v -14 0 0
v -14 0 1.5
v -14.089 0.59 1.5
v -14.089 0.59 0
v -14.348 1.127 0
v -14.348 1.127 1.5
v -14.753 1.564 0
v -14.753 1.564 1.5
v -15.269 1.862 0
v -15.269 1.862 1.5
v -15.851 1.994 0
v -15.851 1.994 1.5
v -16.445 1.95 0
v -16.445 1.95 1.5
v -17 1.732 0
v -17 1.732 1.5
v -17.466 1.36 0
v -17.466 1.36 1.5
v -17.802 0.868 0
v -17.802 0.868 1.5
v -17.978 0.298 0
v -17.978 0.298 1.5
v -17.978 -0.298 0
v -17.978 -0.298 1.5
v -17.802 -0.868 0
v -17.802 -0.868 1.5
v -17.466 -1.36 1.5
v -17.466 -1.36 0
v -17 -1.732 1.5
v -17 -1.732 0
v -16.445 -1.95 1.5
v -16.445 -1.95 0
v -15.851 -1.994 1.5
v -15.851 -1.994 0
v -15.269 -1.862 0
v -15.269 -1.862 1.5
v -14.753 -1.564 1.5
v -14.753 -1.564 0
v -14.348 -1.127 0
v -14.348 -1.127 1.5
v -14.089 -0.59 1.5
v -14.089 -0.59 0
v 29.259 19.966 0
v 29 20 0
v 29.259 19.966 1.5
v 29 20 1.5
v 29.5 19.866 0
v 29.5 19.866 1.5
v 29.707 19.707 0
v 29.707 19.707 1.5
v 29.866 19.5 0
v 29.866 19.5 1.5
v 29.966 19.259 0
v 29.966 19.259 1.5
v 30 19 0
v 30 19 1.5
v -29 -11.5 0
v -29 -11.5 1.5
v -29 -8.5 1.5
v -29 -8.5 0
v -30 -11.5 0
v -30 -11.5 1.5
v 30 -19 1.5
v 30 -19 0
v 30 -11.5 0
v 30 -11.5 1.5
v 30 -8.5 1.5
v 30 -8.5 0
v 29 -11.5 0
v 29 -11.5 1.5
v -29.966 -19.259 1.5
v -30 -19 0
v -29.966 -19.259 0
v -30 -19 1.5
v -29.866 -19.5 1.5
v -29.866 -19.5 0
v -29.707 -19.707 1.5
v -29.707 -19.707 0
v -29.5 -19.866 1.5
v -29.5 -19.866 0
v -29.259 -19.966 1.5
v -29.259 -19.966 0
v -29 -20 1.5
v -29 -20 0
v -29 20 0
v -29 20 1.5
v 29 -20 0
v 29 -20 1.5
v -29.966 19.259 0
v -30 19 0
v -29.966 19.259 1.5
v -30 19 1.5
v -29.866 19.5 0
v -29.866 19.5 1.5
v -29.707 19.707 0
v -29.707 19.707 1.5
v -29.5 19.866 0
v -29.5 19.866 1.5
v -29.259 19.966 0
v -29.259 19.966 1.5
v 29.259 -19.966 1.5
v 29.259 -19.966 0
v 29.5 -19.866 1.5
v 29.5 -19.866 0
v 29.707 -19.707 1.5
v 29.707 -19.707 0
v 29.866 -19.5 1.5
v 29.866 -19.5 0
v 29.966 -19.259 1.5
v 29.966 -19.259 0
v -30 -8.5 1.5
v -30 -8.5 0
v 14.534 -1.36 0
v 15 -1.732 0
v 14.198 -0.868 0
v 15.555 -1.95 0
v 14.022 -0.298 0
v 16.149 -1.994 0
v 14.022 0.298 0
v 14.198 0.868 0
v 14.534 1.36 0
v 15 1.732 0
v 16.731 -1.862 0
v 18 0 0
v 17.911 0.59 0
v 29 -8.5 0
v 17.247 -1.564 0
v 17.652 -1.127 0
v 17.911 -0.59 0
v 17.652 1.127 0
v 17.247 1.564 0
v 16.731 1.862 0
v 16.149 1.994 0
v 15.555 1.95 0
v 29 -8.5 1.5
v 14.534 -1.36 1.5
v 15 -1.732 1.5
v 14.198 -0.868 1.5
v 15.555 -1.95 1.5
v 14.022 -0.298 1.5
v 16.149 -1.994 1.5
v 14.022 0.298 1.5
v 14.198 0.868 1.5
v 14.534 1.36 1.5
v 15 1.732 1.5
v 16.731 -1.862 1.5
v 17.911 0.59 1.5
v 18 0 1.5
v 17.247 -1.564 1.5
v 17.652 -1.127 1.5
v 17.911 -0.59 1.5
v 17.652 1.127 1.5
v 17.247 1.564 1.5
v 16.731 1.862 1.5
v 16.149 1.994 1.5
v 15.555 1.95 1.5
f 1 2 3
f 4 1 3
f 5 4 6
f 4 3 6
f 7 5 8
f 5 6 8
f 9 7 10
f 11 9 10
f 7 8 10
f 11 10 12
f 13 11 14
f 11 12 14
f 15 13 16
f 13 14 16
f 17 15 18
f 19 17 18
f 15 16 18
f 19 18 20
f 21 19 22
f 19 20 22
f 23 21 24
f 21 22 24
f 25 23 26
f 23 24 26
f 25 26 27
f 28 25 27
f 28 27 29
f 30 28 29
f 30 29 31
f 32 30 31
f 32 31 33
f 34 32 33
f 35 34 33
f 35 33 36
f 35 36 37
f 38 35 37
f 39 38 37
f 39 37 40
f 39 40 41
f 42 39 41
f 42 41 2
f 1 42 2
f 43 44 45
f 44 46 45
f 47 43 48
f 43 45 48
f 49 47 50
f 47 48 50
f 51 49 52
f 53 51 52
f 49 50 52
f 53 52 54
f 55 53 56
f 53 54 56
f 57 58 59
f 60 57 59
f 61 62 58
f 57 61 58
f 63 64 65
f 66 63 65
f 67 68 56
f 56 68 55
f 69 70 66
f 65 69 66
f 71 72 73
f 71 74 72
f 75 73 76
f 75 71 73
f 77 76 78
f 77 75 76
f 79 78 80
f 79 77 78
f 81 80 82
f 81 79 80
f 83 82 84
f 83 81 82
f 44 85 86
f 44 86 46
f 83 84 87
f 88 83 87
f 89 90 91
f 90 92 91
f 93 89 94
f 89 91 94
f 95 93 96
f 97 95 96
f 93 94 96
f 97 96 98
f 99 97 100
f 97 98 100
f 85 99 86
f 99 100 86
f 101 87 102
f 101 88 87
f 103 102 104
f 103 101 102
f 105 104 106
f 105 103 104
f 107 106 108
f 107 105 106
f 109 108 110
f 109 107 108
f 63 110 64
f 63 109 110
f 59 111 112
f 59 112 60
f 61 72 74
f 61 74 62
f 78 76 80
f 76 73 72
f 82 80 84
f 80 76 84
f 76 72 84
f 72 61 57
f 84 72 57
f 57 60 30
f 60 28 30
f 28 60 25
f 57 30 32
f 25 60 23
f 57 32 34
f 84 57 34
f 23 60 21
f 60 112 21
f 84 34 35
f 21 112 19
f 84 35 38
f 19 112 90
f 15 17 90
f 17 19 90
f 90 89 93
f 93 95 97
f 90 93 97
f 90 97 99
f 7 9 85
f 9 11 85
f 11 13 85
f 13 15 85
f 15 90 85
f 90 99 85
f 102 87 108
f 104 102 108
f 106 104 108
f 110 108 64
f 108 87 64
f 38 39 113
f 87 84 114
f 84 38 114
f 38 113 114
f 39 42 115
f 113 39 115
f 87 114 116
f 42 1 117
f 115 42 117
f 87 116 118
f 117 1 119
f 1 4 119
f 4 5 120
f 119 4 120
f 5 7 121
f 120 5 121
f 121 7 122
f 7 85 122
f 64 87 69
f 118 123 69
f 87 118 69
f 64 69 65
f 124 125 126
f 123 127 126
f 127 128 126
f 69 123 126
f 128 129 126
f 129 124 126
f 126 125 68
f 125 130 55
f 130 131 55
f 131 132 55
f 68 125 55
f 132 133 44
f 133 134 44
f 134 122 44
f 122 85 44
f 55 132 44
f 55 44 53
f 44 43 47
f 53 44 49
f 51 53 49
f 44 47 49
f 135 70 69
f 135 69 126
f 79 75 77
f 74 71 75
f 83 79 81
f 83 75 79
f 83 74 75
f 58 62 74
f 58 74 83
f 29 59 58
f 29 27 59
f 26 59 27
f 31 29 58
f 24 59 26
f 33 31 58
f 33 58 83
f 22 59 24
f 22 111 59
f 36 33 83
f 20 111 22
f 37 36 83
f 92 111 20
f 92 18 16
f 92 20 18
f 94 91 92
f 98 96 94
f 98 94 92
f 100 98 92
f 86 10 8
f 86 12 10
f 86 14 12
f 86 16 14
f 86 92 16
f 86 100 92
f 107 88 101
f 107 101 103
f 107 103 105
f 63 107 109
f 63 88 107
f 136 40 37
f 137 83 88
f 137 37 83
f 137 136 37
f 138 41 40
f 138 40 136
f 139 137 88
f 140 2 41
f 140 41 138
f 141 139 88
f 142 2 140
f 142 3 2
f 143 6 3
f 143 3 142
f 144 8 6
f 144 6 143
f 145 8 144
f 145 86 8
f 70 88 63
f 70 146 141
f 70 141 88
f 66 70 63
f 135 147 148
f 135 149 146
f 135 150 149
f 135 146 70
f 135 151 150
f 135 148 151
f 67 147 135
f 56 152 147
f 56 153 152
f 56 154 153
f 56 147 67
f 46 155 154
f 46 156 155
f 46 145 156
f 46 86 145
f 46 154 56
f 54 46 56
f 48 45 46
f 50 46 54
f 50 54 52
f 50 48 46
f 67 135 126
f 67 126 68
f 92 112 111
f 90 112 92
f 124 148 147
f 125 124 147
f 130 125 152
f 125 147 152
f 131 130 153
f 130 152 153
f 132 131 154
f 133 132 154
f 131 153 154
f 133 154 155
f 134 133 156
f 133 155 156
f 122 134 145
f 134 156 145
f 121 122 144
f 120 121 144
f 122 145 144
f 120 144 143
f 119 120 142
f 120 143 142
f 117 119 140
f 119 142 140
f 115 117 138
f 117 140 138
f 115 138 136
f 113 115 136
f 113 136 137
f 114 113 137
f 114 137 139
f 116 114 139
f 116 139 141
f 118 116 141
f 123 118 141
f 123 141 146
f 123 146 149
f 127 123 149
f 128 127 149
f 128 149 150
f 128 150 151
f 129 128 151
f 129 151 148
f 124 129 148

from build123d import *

# Parameters (mm, degrees)
SKETCH_1_W          = 60
SKETCH_1_H          = 40
EXTRUDE_1_DEPTH     = 1.5
SKETCH_3_R          = 2
CUT_EXTRUDE_1_DEPTH = 10
SKETCH_4_W          = 1
SKETCH_4_H          = 3
CUT_EXTRUDE_2_DEPTH = 10
FILLET_1_R          = 1


with BuildPart() as part:
    # 草图1 → 凸台-拉伸1 (new body)
    with BuildSketch(Plane.XY):
        Rectangle(SKETCH_1_W, SKETCH_1_H)
    extrude(amount=EXTRUDE_1_DEPTH)

    # 草图3 → 切除-拉伸1 (cut)
    with BuildSketch(Plane.XY.offset(1.5)):
        with Locations((-16, 0)):
            Circle(SKETCH_3_R)
        with Locations((16, 0)):
            Circle(SKETCH_3_R)
    extrude(amount=-CUT_EXTRUDE_1_DEPTH, mode=Mode.SUBTRACT)

    # 草图4 → 切除-拉伸2 (cut)
    with BuildSketch(Plane.XY.offset(1.5)):
        with Locations((-29.5, -10)):
            Rectangle(SKETCH_4_W, SKETCH_4_H)
        with Locations((29.5, -10)):
            Rectangle(SKETCH_4_W, SKETCH_4_H)
    extrude(amount=-CUT_EXTRUDE_2_DEPTH, mode=Mode.SUBTRACT)

    # 圆角1
    fillet_1_edges = [part.edges().sort_by_distance(p)[0] for p in [
        (-30, 20, 0.75),
        (30, 20, 0.75),
        (30, -20, 0.75),
        (-30, -20, 0.75),
    ]]
    fillet(fillet_1_edges, radius=FILLET_1_R)


solid = part.part
